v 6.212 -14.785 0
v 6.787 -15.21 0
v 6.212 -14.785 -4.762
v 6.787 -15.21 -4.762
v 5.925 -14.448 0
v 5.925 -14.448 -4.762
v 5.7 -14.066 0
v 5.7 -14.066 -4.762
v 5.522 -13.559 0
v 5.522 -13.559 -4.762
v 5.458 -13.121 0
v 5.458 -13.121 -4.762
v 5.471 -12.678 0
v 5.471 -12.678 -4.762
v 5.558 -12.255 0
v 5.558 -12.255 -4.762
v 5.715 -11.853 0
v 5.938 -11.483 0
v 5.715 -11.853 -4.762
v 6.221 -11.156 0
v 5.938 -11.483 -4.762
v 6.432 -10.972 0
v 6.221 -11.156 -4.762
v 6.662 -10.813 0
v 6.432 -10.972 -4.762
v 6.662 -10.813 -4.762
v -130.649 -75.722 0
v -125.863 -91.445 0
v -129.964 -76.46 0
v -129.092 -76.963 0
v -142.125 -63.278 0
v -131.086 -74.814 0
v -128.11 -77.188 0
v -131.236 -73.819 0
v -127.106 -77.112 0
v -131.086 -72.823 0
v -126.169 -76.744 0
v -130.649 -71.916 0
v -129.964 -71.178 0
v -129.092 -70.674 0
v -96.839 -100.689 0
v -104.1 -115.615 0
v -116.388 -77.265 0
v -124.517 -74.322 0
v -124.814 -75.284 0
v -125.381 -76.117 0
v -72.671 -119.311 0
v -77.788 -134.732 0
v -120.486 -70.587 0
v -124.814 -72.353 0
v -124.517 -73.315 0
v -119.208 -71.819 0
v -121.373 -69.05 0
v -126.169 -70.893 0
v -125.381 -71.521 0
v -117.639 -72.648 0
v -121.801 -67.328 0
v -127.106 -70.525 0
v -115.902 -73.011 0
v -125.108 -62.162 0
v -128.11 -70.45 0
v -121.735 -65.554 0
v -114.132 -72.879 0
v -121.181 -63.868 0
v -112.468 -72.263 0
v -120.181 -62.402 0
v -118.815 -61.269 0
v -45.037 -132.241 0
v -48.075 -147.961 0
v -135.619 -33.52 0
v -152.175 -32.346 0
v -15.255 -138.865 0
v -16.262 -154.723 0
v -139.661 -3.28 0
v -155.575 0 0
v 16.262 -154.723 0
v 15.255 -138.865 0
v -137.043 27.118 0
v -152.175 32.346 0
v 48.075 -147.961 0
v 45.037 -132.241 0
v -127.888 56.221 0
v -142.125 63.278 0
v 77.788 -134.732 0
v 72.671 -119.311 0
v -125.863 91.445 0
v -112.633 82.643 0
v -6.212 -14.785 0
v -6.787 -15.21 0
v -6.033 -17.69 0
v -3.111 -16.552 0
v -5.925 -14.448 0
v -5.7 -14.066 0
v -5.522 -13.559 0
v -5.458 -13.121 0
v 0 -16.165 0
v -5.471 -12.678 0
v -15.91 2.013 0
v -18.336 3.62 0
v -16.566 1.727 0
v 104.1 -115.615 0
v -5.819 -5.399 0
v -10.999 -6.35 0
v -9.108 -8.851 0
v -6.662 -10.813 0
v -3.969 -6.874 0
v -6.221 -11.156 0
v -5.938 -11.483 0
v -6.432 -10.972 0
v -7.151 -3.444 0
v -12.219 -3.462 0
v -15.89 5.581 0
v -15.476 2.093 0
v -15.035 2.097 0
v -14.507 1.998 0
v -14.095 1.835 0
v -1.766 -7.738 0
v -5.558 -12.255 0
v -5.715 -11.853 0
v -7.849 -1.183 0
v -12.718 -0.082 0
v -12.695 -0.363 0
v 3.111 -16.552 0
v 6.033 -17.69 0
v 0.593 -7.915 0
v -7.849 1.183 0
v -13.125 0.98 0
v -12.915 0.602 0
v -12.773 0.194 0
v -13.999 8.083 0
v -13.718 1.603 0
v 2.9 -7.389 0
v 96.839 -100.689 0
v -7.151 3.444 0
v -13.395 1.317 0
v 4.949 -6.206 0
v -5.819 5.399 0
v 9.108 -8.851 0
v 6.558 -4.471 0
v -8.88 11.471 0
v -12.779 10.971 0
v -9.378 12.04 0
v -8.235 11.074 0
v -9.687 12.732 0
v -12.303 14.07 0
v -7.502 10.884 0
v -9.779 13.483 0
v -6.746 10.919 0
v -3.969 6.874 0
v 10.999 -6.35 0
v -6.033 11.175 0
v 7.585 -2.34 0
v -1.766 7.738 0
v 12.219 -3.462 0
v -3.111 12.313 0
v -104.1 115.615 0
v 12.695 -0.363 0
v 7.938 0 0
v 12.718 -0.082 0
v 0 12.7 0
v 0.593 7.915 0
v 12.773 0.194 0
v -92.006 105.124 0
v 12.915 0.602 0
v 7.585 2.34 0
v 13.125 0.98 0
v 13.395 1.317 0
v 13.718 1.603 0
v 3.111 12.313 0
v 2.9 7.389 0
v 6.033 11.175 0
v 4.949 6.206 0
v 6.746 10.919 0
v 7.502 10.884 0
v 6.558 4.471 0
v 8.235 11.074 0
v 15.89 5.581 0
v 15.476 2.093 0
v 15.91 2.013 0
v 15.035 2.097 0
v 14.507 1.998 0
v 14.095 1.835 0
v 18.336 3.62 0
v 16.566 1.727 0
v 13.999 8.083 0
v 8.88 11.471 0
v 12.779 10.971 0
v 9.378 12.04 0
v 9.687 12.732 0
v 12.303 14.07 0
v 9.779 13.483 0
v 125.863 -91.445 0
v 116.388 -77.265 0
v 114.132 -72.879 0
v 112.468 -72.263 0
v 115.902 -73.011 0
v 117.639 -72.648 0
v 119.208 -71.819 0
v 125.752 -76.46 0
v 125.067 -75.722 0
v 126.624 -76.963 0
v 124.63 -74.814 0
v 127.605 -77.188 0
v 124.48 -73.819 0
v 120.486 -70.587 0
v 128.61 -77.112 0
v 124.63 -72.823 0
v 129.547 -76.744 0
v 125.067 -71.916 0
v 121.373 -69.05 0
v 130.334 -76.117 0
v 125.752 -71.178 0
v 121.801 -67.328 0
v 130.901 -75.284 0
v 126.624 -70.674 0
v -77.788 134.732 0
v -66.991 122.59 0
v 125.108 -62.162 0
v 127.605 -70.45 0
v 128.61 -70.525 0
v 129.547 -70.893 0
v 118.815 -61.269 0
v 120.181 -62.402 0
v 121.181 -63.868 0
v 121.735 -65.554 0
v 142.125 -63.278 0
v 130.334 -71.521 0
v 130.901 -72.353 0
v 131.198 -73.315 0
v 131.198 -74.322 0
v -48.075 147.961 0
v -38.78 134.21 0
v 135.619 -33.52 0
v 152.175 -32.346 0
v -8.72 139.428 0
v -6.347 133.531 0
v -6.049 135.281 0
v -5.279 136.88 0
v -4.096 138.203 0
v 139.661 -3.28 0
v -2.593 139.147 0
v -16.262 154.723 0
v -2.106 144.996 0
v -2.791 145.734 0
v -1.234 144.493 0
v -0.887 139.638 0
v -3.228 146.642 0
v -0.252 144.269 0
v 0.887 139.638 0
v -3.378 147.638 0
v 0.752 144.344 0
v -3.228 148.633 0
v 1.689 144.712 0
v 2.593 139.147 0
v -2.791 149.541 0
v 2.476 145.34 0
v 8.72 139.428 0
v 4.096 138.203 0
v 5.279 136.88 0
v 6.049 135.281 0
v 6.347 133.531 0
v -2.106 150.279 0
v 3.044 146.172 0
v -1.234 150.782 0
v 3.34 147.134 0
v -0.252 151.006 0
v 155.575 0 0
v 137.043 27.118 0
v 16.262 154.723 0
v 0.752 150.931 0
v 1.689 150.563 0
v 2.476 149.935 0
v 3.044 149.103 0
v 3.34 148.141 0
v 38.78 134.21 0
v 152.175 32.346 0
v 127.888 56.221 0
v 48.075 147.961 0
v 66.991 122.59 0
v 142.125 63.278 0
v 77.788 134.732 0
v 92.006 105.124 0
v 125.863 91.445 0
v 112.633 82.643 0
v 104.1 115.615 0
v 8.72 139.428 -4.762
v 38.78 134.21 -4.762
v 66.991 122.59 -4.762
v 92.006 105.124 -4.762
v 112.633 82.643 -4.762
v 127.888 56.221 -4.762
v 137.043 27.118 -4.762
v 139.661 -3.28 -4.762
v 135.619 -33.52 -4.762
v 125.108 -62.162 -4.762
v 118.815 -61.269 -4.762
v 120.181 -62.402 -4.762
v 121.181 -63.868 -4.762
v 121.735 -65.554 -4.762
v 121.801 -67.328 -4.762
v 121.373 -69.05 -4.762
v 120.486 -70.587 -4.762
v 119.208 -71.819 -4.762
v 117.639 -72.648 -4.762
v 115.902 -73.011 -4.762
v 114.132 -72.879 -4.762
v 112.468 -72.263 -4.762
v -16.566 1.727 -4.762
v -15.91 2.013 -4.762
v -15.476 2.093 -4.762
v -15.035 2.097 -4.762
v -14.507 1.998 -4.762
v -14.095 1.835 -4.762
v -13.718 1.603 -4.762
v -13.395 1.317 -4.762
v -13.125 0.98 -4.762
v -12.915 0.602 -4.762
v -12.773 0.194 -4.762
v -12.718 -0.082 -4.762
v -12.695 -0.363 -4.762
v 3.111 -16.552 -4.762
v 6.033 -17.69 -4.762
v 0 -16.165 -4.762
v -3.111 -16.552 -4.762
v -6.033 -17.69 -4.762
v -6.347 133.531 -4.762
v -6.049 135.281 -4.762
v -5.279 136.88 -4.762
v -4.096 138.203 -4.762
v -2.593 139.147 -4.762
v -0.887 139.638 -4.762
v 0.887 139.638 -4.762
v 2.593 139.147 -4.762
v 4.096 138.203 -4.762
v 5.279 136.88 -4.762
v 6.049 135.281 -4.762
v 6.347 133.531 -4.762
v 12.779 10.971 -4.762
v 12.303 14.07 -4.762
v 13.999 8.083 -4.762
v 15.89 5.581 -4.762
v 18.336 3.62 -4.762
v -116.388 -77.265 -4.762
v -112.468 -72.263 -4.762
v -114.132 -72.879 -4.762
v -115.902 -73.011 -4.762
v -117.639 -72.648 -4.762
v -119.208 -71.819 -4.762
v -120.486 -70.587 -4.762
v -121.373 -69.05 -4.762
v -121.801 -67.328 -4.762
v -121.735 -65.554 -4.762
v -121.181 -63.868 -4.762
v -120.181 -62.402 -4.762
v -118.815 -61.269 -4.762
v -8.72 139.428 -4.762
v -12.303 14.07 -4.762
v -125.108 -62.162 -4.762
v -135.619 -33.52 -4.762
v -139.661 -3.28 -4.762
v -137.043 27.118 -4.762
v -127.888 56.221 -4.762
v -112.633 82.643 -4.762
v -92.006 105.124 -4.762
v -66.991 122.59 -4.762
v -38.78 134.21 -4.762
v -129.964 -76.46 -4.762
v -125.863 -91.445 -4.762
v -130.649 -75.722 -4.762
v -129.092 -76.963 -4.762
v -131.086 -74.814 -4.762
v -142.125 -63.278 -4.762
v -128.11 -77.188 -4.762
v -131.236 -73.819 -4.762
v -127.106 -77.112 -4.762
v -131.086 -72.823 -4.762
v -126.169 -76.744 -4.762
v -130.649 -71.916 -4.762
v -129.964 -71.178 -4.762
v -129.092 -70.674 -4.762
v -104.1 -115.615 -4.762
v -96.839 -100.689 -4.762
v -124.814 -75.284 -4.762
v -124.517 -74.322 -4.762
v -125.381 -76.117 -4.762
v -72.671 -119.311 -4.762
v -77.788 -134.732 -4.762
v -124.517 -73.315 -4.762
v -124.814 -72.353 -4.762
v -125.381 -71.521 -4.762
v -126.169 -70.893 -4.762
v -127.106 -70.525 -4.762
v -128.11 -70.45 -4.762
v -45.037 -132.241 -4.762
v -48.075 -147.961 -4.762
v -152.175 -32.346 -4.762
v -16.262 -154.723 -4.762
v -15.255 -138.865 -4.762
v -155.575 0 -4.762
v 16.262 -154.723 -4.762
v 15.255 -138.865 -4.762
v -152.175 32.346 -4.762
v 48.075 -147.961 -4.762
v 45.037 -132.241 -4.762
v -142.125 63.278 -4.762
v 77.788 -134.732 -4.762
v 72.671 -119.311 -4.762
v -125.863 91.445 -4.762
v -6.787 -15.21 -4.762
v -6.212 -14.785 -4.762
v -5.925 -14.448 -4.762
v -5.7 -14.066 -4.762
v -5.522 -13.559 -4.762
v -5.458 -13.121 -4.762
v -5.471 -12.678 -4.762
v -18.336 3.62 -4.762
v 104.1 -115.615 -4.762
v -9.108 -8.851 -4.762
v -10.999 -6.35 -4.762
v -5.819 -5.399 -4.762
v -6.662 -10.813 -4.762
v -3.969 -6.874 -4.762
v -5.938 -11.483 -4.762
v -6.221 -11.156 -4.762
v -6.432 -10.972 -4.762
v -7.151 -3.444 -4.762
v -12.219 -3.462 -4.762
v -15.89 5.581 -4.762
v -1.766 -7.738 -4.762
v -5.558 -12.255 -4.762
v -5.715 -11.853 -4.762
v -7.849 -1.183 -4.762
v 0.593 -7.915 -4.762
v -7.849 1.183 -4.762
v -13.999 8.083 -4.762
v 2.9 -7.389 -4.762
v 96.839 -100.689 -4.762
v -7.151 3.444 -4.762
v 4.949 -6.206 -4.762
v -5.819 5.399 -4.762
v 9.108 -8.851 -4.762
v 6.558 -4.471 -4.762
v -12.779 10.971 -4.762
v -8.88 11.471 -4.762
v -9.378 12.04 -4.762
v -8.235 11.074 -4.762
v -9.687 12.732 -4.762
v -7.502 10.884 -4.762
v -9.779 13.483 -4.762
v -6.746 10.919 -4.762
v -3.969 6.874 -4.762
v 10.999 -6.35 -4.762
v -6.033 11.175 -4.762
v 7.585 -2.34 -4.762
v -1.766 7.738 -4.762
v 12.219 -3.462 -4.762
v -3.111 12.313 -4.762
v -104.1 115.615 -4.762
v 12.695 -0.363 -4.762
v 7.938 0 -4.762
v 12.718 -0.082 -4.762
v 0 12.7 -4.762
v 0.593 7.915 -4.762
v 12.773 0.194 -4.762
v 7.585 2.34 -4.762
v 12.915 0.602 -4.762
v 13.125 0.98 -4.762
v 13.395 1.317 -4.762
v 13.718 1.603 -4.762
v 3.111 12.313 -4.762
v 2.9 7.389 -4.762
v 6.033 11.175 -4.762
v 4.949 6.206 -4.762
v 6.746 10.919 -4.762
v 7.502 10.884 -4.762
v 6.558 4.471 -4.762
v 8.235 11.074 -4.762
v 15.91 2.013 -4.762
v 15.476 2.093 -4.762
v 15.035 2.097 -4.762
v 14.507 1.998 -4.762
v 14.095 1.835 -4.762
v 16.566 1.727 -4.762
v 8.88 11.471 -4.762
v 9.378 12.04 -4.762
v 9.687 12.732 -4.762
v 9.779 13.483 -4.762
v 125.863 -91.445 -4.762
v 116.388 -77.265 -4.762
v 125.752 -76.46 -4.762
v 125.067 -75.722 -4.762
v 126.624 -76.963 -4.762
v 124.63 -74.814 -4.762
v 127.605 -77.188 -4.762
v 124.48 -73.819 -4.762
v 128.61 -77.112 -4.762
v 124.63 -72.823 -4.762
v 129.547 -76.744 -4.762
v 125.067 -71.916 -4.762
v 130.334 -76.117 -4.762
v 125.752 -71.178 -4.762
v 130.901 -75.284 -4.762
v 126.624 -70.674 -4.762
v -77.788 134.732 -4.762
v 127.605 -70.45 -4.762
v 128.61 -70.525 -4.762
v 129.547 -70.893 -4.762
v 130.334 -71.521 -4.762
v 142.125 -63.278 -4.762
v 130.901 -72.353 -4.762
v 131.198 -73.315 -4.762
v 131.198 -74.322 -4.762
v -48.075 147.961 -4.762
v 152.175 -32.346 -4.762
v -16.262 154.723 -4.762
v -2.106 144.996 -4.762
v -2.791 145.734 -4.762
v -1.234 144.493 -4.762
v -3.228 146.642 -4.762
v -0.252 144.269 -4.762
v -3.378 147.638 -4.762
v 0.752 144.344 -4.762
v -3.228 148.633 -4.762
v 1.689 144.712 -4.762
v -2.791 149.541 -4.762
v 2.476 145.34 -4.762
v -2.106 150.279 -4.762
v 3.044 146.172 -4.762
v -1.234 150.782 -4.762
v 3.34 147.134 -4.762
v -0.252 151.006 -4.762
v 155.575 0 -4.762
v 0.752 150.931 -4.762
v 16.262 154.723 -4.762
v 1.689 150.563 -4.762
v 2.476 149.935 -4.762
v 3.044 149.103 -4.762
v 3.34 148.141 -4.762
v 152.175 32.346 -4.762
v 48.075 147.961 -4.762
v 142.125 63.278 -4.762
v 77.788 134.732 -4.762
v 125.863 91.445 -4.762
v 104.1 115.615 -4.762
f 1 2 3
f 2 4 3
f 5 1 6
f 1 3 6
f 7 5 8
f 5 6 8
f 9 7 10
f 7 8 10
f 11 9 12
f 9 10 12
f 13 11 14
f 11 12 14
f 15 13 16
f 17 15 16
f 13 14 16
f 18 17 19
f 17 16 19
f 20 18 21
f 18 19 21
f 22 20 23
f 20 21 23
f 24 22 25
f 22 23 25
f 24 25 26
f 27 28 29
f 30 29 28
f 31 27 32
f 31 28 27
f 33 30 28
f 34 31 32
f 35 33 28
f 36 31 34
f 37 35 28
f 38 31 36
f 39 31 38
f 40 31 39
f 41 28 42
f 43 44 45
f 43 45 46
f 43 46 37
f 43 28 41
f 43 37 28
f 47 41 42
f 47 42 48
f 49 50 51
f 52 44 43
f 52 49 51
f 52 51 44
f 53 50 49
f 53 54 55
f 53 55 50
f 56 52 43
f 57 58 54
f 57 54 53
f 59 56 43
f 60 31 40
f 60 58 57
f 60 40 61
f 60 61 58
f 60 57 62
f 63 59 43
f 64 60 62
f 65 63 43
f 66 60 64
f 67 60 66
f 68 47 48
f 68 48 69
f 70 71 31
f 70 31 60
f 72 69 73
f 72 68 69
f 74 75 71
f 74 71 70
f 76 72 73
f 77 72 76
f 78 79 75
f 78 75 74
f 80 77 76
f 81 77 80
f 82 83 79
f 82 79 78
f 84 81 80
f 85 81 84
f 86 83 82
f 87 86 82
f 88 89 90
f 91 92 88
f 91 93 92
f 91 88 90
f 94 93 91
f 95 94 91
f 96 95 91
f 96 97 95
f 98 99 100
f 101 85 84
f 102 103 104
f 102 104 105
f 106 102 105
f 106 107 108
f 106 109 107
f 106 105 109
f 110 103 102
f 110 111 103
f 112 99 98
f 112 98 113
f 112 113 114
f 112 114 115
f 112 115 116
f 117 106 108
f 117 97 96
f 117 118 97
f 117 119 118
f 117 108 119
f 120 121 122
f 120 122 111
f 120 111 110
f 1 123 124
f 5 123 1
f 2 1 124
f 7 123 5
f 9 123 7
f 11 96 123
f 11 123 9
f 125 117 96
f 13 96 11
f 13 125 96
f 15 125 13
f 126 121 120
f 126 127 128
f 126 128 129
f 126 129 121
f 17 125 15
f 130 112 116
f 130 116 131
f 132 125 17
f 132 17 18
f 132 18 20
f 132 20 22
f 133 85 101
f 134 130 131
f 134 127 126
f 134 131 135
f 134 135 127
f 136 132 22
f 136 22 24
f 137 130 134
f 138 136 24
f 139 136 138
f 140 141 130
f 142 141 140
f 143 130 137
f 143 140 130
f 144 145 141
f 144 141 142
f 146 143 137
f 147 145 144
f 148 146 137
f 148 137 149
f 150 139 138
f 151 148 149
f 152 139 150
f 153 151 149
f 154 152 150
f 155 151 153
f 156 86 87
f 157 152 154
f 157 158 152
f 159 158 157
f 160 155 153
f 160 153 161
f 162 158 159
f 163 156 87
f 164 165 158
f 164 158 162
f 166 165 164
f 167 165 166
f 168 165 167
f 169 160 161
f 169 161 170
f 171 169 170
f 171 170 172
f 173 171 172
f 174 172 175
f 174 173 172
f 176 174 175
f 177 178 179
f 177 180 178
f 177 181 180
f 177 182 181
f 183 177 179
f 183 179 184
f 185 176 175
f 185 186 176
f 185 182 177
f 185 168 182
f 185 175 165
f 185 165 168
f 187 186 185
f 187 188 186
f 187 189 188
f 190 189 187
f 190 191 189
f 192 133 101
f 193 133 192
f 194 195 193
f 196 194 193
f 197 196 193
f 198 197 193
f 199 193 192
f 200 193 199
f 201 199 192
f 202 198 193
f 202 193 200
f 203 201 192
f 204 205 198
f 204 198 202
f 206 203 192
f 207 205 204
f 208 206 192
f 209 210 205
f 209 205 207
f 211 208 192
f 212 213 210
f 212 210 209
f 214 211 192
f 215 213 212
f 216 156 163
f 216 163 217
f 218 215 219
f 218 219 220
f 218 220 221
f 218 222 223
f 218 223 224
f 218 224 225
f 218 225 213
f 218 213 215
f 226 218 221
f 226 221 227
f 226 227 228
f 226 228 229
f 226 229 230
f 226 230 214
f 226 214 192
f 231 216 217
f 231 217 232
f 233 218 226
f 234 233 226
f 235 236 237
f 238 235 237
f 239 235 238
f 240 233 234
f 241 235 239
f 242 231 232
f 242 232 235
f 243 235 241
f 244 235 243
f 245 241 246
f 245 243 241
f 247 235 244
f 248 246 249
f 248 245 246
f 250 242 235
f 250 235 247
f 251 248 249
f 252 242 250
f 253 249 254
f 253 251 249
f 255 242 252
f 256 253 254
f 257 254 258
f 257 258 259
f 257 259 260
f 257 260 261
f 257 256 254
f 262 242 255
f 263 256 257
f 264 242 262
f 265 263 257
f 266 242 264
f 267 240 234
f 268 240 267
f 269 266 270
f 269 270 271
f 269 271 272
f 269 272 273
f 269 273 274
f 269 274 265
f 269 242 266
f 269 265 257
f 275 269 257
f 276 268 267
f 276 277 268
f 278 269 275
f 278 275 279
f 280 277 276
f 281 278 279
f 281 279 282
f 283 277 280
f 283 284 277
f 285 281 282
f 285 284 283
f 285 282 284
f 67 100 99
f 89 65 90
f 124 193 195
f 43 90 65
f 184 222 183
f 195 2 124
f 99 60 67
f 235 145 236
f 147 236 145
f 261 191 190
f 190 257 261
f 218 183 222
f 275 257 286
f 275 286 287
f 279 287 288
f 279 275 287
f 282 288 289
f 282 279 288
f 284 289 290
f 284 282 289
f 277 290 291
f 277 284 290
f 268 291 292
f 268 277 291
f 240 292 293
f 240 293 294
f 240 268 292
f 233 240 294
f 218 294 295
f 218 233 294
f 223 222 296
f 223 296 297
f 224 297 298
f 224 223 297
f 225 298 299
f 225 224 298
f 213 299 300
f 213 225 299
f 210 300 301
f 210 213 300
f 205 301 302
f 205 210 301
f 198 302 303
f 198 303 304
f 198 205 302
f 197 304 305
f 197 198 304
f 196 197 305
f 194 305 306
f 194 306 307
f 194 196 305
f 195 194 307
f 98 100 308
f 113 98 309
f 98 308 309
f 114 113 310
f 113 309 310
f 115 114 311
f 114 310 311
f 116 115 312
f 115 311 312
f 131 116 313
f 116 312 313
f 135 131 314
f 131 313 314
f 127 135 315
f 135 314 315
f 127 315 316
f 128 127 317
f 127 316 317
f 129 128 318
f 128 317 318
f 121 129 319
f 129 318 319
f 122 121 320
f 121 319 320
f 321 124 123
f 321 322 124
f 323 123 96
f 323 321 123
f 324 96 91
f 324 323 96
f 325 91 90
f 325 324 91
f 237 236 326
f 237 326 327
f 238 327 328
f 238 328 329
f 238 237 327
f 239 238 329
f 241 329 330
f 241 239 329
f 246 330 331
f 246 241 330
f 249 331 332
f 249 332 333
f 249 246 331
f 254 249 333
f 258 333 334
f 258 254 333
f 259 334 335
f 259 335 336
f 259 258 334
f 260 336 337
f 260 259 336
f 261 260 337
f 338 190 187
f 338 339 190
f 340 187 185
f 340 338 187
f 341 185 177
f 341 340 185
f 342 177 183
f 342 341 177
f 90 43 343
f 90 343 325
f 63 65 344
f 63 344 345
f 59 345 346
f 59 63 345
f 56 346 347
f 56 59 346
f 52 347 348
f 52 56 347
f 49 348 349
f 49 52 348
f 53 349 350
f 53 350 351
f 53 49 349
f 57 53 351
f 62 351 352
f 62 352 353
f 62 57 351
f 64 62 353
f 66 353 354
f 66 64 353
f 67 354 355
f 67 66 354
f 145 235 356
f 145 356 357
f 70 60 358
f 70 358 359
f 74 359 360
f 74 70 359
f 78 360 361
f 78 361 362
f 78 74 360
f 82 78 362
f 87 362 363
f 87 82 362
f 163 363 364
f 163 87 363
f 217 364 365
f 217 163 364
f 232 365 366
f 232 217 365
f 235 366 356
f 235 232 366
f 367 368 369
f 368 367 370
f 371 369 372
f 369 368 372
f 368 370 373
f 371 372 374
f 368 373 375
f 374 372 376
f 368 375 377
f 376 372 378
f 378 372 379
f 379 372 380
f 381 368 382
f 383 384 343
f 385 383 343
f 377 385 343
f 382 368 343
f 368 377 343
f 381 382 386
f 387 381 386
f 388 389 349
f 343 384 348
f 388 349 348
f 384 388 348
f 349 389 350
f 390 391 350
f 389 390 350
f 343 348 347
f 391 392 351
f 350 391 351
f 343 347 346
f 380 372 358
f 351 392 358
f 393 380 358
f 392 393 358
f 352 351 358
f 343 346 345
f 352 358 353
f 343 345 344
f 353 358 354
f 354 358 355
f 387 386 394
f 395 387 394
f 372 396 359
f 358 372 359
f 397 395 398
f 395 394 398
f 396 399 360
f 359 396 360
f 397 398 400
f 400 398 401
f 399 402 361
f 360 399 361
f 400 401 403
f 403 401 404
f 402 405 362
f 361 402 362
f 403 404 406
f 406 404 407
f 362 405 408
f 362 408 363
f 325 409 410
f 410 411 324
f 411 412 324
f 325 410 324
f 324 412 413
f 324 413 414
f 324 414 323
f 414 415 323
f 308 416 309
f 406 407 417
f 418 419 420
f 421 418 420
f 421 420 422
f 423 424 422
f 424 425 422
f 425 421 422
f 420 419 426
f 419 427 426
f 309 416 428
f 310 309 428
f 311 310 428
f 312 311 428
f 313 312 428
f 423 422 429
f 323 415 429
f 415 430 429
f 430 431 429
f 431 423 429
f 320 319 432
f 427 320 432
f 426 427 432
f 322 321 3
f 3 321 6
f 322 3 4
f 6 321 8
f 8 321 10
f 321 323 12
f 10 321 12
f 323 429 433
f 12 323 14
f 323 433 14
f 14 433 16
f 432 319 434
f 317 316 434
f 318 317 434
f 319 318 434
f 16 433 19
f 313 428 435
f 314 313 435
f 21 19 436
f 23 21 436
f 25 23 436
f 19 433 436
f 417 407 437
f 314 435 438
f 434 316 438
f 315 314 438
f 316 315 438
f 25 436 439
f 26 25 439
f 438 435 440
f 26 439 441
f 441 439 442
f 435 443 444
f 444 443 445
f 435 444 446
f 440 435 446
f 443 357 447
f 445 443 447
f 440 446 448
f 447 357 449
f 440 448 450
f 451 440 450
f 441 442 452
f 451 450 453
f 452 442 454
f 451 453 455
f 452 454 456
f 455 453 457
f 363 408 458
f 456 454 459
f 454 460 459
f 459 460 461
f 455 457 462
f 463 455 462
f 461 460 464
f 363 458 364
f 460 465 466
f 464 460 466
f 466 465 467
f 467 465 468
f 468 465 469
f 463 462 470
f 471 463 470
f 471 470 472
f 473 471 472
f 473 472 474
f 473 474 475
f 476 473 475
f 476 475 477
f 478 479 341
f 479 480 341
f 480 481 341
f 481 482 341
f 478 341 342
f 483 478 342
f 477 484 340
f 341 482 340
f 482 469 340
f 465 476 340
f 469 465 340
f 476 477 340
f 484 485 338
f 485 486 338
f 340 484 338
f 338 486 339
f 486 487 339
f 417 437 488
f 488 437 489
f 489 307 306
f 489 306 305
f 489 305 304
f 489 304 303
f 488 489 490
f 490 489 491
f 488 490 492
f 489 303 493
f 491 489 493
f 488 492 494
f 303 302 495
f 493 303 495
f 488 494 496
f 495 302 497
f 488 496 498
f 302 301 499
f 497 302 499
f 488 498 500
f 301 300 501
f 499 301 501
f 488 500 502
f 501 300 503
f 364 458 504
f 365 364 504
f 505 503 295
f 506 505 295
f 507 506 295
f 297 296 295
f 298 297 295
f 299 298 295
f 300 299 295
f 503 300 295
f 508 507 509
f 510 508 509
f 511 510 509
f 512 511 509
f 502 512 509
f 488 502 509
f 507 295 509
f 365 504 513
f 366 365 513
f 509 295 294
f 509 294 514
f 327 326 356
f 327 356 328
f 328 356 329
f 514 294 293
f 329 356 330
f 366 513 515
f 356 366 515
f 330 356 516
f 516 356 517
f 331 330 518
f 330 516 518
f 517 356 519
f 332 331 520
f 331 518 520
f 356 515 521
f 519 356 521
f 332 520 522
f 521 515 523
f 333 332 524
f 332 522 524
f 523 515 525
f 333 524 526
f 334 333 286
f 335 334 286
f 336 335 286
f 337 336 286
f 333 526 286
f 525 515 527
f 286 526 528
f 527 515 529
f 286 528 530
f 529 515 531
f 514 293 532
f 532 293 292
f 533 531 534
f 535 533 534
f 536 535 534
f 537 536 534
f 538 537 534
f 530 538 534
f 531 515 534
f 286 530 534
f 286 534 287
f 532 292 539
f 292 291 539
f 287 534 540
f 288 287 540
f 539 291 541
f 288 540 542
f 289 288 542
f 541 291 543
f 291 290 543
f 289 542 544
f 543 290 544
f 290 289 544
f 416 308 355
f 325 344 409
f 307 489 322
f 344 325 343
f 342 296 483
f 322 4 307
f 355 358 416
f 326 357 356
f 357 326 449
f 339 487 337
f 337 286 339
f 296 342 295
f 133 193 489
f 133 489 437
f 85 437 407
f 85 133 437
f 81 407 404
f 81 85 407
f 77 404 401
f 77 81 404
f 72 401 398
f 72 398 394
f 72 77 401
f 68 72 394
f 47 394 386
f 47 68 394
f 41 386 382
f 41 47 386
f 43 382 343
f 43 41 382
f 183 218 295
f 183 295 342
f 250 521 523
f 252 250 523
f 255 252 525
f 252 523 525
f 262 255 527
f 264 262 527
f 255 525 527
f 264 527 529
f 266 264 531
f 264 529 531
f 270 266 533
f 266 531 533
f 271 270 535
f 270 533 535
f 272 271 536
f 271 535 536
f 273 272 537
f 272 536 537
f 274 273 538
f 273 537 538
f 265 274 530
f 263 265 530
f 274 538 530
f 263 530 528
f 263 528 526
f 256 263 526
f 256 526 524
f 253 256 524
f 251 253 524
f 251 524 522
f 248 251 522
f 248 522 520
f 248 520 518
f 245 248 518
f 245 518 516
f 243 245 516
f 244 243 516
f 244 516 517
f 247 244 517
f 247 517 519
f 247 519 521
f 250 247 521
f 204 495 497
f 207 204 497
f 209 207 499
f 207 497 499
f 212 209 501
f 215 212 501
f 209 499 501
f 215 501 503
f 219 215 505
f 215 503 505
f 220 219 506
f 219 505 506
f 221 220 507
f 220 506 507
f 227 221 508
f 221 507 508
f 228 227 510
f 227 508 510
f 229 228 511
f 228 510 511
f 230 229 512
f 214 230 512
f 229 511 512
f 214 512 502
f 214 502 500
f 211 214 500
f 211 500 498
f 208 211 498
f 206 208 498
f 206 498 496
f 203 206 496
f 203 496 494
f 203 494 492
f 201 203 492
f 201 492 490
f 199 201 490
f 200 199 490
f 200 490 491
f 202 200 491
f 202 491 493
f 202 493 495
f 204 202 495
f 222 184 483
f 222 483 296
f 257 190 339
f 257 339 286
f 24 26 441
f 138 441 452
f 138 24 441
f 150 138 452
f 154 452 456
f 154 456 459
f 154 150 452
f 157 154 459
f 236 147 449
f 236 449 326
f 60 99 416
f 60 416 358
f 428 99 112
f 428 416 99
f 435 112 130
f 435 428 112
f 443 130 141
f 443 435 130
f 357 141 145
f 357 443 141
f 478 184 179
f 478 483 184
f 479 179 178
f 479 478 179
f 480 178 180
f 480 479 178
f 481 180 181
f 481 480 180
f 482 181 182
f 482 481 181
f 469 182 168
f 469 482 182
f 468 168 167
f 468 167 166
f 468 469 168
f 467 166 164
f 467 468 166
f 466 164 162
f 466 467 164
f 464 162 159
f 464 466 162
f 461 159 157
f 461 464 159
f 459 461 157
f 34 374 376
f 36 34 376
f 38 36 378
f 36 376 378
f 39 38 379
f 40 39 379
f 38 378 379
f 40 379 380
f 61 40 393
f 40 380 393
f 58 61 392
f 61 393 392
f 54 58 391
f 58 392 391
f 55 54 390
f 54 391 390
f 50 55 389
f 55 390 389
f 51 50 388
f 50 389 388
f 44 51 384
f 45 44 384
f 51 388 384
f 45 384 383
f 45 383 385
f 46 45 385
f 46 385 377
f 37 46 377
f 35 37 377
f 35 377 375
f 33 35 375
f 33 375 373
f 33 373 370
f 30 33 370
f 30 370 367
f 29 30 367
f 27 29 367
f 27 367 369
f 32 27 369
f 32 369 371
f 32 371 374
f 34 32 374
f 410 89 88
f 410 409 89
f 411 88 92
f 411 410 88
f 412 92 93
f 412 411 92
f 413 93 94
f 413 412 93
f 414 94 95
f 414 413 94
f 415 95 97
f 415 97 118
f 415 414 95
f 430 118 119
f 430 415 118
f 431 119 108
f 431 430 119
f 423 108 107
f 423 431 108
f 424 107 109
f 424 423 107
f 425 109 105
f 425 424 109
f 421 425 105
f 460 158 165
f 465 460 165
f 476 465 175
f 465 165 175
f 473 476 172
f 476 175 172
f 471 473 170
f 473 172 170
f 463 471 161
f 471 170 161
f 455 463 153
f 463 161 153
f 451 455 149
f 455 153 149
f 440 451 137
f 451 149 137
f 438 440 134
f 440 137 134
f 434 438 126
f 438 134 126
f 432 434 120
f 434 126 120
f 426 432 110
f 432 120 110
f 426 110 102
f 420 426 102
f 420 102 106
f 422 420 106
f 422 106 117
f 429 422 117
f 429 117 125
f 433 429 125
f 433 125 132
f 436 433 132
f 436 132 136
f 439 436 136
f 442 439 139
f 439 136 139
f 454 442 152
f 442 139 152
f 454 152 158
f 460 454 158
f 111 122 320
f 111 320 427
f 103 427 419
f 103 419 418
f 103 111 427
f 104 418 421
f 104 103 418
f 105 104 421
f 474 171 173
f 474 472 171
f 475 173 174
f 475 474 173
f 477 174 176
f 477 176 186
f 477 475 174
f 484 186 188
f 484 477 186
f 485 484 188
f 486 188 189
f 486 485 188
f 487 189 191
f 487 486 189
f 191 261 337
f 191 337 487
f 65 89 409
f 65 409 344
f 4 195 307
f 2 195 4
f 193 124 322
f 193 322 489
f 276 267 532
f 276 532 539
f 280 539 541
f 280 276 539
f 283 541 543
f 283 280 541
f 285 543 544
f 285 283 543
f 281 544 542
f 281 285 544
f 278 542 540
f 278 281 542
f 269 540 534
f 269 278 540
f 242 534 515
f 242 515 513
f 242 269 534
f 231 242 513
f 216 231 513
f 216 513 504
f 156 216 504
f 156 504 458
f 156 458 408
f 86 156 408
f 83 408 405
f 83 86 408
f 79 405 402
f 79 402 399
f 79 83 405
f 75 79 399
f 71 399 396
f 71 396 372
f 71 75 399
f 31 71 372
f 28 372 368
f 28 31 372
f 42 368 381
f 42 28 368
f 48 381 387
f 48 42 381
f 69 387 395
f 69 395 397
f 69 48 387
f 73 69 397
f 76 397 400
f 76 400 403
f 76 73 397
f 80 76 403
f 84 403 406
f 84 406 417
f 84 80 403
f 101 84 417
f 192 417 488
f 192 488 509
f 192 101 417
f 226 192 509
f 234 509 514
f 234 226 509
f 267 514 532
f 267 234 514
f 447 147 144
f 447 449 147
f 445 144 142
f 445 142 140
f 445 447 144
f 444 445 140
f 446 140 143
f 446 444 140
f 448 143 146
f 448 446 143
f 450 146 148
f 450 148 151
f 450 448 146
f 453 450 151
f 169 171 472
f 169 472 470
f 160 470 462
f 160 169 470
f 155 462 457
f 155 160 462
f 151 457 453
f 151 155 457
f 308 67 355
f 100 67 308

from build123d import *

# Parameters (mm, degrees)
SKETCH1_R                = 155.575
SKETCH1_R_2              = 7.9375
BOSS_EXTRUDE1_DEPTH      = 4.7625
FILLET1_R                = 12.7
FILLET4_R                = 2.54
H_0_266_DIAMETER_HOLE1_D = 6.7564


with BuildPart() as part:
    # Sketch1 → Boss-Extrude1 (new body)
    with BuildSketch(Plane.XY):
        Circle(SKETCH1_R)
        with BuildLine():
            ThreePointArc((-125.107792883, -62.16212802), (-120.983748909, 69.85), (-8.719914422, 139.427590858))
            Line((-8.719914422, 139.427590858), (-12.49892387, 7.216257061))
            Line((-12.49892387, 7.216257061), (-125.107792883, -62.16212802))
        make_face(mode=Mode.SUBTRACT)
        with BuildLine():
            ThreePointArc((8.719914422, 139.427590858), (120.983748909, 69.85), (125.107792883, -62.16212802))
            Line((125.107792883, -62.16212802), (12.49892387, 7.216257061))
            Line((12.49892387, 7.216257061), (8.719914422, 139.427590858))
        make_face(mode=Mode.SUBTRACT)
        with BuildLine():
            ThreePointArc((116.38787846, -77.265462838), (0, -139.7), (-116.38787846, -77.265462838))
            Line((-116.38787846, -77.265462838), (0, -14.432514122))
            Line((0, -14.432514122), (116.38787846, -77.265462838))
        make_face(mode=Mode.SUBTRACT)
        with BuildLine():
            Line((-12.585726429, 4.179407795), (-12.694815268, 0.362857143))
            ThreePointArc((-12.694815268, 0.362857143), (-10.998522628, -6.35), (-6.03316413, -11.17546109))
            Line((-6.03316413, -11.17546109), (-2.673389891, -12.98926271))
            Line((-2.673389891, -12.98926271), (-112.467905529, -72.262730545))
            ThreePointArc((-112.467905529, -72.262730545), (-120.983748909, -69.85), (-118.815313164, -61.268698026))
            Line((-118.815313164, -61.268698026), (-12.585726429, 4.179407795))
        make_face(mode=Mode.SUBTRACT)
        with BuildLine():
            ThreePointArc((118.815313164, -61.268698026), (120.983748909, -69.85), (112.467905529, -72.262730545))
            Line((112.467905529, -72.262730545), (2.673389891, -12.98926271))
            Line((2.673389891, -12.98926271), (6.03316413, -11.17546109))
            ThreePointArc((6.03316413, -11.17546109), (10.998522628, -6.35), (12.694815268, 0.362857143))
            Line((12.694815268, 0.362857143), (12.585726429, 4.179407795))
            Line((12.585726429, 4.179407795), (118.815313164, -61.268698026))
        make_face(mode=Mode.SUBTRACT)
        Circle(SKETCH1_R_2, mode=Mode.SUBTRACT)
        with BuildLine():
            ThreePointArc((-6.347407634, 133.531428571), (0, 139.7), (6.347407634, 133.531428571))
            Line((6.347407634, 133.531428571), (9.938137929, 7.907174875))
            ThreePointArc((9.938137929, 7.907174875), (0, 12.7), (-9.938137929, 7.907174875))
            Line((-9.938137929, 7.907174875), (-6.347407634, 133.531428571))
        make_face(mode=Mode.SUBTRACT)
    extrude(amount=-BOSS_EXTRUDE1_DEPTH)

    # Fillet1
    fillet1_edges = [part.edges().sort_by_distance(p)[0] for p in [
        (12.49892387, 7.216257061, -2.38125),
        (0, -14.432514122, -2.38125),
        (-12.49892387, 7.216257061, -2.38125),
    ]]
    fillet(fillet1_edges, radius=FILLET1_R)

    # Fillet4
    fillet4_edges = [part.edges().sort_by_distance(p)[0] for p in [
        (12.585726429, 4.179407795, -2.38125),
        (2.673389891, -12.98926271, -2.38125),
        (-2.673389891, -12.98926271, -2.38125),
        (-12.585726429, 4.179407795, -2.38125),
        (-9.938137929, 7.907174875, -2.38125),
        (9.938137929, 7.907174875, -2.38125),
    ]]
    fillet(fillet4_edges, radius=FILLET4_R)

    # H (0.266) Diameter Hole1 (through all)
    with Locations(Plane.XY):
        with Locations((0, 147.6375), (127.857825551, -73.81875), (-127.857825551, -73.81875)):
            Hole(H_0_266_DIAMETER_HOLE1_D / 2)


solid = part.part
